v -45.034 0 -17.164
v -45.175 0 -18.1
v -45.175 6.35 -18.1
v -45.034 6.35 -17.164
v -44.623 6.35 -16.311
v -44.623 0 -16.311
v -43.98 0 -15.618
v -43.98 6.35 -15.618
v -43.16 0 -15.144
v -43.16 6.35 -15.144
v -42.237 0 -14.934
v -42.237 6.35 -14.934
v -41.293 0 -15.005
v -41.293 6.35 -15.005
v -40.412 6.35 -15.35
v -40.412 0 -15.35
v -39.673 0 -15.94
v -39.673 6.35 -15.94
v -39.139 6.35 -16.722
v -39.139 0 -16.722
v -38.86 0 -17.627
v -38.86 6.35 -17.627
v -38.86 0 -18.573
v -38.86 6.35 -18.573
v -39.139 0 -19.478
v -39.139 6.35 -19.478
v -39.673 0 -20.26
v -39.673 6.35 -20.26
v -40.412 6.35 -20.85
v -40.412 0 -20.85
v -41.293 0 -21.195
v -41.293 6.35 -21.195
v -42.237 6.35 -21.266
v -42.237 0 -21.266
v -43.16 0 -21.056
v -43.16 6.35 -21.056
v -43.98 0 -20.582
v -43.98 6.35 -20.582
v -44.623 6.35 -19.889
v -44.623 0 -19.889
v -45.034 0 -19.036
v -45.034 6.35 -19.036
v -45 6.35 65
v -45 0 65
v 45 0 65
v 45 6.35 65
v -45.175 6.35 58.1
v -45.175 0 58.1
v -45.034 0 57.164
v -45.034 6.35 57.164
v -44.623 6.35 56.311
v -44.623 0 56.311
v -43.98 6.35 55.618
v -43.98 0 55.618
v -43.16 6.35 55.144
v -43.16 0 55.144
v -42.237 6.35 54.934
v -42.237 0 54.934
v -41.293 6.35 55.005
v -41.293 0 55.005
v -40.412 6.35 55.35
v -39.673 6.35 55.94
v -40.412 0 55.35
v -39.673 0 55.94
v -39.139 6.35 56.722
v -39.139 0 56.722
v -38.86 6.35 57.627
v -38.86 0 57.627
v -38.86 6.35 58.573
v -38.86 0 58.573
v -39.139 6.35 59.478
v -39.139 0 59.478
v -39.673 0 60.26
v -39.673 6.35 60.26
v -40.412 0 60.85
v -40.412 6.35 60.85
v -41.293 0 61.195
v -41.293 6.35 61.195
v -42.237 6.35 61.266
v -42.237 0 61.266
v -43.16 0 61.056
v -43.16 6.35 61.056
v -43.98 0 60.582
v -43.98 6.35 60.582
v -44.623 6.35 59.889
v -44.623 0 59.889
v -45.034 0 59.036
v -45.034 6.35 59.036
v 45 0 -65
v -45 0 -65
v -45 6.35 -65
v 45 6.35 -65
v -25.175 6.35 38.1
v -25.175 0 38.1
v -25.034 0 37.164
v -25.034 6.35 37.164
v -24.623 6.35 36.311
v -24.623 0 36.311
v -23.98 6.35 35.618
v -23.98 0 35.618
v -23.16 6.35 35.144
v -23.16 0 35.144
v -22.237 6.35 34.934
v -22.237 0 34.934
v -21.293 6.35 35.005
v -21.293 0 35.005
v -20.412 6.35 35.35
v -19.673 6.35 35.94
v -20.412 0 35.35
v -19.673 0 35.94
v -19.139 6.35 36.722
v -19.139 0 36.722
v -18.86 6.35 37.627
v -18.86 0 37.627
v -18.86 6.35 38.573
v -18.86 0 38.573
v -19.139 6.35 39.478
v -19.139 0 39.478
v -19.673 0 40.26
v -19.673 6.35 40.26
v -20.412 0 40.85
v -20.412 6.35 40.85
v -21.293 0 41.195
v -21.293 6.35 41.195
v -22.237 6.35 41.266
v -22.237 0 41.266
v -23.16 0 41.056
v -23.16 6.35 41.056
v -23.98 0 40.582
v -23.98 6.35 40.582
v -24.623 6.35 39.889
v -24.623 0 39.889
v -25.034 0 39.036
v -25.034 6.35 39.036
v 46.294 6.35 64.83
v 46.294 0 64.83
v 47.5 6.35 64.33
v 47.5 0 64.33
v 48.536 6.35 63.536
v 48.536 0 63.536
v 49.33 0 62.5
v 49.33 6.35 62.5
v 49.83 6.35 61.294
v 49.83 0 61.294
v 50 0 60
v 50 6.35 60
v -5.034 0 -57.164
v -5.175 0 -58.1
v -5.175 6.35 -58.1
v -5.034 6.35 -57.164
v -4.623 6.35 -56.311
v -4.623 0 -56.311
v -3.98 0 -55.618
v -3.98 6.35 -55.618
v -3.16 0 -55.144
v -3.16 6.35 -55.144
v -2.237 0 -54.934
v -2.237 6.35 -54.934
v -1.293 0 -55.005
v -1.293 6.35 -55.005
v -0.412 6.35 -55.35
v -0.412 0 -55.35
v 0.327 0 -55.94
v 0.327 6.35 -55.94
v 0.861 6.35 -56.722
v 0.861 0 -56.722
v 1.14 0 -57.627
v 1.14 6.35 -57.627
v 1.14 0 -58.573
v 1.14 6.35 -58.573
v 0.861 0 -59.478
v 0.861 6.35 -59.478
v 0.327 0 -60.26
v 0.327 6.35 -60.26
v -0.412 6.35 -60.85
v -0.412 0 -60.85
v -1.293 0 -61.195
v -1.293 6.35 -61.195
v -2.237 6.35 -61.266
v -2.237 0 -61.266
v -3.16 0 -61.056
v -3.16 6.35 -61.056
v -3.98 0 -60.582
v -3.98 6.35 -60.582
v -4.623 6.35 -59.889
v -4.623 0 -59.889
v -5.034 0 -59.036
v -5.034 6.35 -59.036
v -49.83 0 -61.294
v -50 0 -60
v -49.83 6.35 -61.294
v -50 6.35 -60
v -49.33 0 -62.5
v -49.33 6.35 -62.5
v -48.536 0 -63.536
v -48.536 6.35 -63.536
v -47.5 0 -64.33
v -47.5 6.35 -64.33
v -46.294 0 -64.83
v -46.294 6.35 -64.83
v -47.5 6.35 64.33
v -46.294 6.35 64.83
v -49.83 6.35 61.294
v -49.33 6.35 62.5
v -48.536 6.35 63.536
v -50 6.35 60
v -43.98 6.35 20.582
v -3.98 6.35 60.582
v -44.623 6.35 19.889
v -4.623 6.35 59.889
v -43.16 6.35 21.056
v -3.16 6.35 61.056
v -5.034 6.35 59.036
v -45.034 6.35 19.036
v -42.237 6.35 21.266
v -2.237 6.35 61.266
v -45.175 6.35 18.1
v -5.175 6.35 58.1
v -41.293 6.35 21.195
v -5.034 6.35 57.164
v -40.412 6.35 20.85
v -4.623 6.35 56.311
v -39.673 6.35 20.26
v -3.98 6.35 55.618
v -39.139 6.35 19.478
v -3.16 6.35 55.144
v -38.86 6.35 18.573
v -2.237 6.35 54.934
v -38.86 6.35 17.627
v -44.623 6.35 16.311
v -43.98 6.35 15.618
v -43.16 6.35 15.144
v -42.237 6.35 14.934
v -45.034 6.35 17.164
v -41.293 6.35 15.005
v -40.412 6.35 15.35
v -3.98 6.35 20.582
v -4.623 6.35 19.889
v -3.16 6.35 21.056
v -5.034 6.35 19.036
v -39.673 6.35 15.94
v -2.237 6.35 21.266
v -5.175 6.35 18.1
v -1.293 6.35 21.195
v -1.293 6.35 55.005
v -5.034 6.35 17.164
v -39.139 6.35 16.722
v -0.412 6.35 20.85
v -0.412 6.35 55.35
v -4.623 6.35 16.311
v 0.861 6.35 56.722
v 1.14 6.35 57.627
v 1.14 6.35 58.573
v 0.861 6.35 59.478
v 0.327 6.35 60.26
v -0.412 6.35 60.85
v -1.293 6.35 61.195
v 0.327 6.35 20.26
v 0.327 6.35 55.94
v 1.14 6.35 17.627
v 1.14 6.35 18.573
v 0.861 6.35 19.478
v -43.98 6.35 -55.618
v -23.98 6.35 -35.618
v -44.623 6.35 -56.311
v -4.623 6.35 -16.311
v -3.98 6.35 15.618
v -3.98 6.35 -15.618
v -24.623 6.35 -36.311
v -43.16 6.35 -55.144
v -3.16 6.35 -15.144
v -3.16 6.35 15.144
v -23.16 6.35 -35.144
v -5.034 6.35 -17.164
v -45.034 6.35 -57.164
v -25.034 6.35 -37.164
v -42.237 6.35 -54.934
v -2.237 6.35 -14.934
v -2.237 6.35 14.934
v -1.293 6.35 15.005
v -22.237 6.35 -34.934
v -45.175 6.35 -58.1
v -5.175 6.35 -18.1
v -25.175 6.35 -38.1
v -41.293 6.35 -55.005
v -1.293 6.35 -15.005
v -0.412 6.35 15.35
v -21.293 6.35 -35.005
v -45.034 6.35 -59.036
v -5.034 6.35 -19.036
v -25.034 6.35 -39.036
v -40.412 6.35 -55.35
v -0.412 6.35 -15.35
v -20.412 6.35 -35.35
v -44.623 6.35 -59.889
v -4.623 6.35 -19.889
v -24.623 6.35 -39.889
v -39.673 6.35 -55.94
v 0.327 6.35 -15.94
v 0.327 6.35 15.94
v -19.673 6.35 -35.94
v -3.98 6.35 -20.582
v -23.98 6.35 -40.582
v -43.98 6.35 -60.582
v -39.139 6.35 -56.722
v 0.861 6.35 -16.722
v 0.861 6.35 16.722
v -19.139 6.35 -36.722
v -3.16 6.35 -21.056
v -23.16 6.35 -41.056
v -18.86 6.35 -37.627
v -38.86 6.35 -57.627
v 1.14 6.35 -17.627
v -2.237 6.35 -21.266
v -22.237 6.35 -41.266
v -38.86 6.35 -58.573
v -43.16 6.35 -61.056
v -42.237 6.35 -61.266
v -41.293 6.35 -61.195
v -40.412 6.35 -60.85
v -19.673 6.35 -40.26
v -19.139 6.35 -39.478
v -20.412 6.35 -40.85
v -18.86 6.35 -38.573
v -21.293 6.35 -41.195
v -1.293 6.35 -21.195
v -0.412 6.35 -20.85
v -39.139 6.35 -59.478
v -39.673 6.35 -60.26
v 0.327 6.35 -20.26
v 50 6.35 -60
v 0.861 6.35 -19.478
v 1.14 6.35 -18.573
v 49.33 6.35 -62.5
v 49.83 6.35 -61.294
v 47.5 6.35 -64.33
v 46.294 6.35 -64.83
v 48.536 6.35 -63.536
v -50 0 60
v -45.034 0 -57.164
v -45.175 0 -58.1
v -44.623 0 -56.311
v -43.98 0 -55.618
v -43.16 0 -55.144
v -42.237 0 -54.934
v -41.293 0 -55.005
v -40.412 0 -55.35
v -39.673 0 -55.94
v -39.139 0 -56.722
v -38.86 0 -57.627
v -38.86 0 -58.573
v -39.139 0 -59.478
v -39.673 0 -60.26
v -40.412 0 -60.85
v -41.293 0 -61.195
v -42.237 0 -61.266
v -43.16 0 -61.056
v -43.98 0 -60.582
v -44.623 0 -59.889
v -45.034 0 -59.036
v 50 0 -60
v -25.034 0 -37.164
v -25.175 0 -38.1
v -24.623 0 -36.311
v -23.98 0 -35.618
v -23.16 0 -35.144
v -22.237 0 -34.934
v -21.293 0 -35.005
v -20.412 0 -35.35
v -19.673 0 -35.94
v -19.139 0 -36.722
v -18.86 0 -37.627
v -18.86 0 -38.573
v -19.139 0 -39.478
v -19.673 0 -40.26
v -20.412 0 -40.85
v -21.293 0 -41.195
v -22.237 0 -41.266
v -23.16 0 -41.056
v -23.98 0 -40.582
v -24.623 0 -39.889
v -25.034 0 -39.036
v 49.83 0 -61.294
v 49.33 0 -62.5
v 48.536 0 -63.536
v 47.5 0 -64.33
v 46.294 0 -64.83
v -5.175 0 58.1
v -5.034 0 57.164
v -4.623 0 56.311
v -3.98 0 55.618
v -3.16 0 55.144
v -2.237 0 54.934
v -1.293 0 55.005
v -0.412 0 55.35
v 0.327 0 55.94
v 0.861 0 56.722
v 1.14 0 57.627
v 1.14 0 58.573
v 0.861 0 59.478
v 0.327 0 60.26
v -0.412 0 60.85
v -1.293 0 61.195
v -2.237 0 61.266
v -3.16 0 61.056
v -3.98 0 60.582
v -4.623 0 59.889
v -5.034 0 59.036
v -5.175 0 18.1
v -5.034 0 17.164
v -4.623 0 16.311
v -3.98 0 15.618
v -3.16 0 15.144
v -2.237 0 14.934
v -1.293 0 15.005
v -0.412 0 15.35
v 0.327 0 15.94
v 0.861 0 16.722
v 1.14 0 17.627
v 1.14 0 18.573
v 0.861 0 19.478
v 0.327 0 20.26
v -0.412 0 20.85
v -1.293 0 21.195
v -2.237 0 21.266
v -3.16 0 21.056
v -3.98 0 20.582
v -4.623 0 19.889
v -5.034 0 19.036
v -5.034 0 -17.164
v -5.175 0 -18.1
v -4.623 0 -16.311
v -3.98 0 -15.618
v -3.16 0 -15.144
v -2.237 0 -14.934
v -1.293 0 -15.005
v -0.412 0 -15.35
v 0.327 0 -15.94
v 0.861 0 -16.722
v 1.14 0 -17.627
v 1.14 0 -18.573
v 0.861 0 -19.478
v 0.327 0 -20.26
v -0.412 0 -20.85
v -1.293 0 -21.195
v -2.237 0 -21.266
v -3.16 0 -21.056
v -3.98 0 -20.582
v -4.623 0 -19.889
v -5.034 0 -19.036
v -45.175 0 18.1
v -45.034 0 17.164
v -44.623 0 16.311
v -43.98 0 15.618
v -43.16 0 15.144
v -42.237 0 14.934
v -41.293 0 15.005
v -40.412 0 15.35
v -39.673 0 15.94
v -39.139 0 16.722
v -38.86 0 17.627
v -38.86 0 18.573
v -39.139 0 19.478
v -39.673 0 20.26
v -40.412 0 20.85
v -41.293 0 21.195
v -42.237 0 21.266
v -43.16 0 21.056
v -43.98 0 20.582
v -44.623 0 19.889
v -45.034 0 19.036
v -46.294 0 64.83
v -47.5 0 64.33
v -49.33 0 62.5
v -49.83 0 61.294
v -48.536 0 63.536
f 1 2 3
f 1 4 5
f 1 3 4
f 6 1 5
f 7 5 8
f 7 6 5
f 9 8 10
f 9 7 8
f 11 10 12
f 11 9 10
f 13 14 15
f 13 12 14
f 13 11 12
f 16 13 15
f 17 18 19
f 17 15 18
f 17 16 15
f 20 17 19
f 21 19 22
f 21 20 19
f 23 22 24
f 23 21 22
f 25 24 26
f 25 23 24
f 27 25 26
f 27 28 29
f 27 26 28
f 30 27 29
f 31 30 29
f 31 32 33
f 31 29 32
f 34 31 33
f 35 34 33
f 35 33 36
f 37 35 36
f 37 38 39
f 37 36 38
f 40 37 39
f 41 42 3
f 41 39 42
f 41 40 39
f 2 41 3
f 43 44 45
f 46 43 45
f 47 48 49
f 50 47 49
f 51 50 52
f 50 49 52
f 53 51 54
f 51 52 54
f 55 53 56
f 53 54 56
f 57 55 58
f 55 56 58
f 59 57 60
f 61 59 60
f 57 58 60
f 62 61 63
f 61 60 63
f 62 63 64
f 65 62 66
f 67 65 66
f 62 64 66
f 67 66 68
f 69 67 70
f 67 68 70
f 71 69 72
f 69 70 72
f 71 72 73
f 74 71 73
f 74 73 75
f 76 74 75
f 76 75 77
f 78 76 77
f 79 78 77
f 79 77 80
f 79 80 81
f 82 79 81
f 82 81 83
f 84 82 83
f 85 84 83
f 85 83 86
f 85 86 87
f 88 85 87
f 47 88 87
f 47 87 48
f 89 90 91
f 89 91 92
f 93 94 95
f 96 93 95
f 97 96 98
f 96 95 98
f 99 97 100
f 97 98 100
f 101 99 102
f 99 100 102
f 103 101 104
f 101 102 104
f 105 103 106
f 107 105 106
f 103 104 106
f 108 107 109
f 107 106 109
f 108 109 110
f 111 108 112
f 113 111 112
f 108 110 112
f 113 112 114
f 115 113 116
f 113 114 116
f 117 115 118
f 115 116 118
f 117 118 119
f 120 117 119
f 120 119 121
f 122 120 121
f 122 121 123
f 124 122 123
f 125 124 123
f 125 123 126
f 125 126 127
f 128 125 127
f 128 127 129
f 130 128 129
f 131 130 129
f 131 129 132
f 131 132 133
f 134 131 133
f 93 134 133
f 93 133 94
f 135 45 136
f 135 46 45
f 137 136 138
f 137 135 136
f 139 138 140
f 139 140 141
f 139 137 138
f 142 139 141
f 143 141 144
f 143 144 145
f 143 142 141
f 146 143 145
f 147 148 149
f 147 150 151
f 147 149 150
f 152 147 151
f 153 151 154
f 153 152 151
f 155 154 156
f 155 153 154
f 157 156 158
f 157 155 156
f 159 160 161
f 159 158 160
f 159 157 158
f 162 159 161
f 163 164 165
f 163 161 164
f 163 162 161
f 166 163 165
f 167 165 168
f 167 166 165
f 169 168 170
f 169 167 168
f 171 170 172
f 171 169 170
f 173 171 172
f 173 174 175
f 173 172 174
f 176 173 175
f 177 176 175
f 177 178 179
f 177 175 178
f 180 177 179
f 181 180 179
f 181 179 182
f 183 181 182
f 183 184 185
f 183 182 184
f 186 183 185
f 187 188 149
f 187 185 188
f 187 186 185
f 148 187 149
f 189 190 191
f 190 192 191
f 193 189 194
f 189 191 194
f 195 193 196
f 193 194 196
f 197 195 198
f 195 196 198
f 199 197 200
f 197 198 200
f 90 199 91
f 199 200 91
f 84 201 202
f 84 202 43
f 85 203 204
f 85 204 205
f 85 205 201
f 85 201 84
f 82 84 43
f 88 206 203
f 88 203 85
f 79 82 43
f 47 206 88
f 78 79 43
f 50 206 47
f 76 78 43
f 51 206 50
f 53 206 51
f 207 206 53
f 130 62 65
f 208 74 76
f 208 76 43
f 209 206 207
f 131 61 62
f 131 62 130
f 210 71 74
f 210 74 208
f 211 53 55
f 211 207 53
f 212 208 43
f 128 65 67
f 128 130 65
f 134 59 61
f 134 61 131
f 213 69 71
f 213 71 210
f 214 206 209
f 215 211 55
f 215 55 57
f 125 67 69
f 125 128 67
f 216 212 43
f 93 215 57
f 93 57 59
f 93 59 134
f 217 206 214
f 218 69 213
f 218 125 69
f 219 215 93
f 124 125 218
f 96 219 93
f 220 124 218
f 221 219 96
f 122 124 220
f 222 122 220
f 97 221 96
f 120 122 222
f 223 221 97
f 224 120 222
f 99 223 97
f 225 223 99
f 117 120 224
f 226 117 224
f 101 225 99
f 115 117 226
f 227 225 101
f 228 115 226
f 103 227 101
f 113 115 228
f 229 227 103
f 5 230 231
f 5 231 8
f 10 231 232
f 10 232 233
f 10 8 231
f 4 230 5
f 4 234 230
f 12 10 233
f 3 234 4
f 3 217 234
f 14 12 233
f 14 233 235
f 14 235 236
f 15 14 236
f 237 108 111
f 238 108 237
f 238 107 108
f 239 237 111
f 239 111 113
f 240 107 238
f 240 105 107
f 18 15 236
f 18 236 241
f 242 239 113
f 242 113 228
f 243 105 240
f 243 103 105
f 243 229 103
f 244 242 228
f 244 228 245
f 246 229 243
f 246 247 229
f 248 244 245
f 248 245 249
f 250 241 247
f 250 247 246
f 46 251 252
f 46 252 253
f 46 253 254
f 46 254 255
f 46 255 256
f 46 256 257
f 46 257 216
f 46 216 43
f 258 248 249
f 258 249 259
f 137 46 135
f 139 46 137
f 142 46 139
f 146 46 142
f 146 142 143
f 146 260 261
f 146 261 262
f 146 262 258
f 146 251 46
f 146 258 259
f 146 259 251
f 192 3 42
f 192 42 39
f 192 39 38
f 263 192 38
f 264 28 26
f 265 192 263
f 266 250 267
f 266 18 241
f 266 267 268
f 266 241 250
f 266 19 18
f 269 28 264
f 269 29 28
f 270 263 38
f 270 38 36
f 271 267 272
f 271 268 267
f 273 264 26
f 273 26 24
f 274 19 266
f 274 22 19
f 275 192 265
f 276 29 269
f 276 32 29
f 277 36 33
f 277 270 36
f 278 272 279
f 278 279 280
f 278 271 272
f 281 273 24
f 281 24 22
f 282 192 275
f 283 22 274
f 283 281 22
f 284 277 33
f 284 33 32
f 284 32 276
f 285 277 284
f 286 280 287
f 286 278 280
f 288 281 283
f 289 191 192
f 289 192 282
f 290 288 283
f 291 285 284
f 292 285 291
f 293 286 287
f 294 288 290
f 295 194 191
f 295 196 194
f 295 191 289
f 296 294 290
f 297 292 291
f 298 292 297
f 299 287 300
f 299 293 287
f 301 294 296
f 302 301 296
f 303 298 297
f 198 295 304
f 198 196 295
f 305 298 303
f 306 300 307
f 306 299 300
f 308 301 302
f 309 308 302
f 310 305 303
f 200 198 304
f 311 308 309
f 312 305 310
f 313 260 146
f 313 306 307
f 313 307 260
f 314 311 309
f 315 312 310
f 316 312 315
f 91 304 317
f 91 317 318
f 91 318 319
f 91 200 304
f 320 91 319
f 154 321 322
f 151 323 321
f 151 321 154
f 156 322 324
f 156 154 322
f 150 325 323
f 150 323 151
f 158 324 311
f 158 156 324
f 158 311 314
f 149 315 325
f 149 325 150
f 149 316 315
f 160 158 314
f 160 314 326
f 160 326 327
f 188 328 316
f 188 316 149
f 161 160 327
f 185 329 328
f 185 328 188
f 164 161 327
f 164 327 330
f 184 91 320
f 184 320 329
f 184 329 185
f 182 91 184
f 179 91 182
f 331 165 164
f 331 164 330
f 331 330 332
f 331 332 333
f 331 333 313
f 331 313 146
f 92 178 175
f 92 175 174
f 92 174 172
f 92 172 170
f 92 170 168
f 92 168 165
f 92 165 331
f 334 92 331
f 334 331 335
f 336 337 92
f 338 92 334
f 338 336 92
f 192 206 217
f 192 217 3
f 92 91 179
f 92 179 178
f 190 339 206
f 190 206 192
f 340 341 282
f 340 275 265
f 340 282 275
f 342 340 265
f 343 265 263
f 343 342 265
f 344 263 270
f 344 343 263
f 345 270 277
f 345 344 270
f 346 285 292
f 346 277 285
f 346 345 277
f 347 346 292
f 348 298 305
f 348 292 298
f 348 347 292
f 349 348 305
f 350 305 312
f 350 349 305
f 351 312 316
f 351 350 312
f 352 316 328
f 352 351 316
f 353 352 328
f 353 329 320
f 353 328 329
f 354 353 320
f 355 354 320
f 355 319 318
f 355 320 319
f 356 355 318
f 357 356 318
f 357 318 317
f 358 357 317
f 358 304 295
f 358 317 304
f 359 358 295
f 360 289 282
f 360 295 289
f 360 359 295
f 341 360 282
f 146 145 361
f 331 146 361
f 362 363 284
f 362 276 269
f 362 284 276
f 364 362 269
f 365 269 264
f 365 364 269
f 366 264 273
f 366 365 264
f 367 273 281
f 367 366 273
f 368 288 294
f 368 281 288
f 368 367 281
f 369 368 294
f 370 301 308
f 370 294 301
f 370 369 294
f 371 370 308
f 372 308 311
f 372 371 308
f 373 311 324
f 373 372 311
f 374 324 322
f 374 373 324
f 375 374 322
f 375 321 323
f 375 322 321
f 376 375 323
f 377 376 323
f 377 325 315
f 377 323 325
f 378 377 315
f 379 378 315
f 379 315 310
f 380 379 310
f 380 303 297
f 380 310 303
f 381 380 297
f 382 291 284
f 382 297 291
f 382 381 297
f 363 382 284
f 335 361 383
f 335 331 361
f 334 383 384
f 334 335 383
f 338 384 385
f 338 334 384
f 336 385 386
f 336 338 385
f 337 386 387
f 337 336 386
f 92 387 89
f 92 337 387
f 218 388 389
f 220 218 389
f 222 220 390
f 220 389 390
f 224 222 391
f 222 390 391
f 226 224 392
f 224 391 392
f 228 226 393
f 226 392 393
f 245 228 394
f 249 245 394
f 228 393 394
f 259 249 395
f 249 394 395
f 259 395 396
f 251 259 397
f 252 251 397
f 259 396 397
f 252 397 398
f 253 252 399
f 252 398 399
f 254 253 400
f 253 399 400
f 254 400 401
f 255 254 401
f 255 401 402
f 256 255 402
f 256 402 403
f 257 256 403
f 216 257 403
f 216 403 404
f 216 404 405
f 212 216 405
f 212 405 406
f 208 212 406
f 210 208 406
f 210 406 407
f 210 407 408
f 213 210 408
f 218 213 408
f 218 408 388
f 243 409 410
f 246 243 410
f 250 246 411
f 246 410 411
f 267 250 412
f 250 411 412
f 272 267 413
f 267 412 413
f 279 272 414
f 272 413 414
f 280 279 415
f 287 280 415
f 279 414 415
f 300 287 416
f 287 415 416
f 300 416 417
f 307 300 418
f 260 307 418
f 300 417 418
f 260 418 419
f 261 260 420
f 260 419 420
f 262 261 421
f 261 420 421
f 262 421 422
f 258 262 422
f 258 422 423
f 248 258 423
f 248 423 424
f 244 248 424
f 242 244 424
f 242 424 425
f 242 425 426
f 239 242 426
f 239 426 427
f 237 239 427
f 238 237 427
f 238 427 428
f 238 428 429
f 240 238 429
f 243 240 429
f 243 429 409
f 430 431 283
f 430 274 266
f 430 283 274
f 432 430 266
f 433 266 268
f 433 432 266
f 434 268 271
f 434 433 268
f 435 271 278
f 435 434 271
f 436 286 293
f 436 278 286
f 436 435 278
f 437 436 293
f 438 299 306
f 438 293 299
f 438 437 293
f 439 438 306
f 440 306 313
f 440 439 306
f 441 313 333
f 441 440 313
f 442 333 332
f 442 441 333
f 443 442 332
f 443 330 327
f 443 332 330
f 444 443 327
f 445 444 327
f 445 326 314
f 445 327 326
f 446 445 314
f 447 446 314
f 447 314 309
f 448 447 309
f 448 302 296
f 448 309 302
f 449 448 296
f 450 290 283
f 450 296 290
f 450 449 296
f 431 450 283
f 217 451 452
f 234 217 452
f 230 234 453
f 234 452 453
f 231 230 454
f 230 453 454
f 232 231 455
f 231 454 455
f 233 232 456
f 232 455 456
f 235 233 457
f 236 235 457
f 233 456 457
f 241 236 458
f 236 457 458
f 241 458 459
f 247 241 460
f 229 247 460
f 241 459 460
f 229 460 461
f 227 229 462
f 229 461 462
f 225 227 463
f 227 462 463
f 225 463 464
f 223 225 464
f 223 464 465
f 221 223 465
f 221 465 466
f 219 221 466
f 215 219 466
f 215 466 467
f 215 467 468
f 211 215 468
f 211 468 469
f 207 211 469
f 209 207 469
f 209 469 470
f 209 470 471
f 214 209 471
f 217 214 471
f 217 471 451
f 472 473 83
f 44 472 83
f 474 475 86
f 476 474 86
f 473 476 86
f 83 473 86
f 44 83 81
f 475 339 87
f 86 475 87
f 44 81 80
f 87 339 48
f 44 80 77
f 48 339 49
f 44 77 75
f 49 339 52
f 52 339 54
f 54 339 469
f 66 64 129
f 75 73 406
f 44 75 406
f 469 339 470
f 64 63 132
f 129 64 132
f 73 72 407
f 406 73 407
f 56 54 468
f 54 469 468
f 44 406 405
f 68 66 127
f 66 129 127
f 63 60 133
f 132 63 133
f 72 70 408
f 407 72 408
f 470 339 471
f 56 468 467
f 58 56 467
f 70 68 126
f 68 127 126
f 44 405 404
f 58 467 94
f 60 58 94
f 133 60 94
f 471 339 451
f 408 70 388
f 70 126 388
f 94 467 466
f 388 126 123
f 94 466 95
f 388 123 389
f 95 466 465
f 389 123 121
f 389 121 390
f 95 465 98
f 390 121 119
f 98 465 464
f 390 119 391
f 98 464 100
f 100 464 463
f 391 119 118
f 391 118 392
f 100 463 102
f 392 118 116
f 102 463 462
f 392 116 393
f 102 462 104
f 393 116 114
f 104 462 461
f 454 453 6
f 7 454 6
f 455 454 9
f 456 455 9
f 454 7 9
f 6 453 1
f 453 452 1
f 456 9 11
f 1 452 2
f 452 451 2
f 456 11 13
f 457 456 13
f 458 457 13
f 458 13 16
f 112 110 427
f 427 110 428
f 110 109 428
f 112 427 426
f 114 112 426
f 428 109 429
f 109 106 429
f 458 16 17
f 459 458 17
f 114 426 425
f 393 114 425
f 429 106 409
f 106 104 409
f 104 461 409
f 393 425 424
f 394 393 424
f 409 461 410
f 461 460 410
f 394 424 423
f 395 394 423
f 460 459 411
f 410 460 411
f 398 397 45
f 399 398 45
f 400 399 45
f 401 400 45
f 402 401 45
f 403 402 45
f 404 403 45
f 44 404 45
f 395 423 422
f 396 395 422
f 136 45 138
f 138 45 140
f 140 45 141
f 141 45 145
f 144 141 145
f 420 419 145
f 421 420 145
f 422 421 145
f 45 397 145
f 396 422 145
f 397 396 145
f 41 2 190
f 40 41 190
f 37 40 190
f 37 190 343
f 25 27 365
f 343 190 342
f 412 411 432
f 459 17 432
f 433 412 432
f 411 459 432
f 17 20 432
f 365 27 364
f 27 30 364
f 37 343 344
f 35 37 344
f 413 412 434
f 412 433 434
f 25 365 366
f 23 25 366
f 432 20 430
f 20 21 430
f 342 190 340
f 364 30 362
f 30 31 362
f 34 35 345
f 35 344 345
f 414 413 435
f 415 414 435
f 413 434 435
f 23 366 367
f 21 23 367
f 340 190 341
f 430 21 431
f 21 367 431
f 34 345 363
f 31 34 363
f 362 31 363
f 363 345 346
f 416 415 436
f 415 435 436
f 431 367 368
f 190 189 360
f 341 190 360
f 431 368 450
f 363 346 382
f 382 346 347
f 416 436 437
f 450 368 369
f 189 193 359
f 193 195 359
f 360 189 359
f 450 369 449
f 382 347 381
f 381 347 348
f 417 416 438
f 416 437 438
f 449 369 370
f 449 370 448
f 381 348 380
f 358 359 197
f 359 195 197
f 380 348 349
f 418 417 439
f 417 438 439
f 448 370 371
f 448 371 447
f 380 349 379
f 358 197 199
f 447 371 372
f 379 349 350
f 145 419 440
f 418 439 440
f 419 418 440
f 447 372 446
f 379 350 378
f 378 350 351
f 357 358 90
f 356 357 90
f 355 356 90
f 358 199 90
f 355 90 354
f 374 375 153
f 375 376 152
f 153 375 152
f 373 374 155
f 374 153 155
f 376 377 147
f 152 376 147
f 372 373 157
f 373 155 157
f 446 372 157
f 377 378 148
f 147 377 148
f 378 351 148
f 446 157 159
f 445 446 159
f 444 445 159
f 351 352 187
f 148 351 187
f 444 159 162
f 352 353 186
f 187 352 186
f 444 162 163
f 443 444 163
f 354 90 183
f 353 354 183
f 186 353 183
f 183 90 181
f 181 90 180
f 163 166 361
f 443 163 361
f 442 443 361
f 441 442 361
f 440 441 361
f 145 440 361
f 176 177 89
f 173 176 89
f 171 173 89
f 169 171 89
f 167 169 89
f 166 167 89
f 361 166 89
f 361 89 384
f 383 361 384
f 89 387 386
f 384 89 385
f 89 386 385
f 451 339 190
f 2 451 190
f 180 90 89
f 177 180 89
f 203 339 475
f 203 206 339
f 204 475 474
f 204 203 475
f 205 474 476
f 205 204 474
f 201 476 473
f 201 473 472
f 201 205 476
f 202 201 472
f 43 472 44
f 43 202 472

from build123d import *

# Parameters (mm, degrees)
SKETCH1_W                   = 100
SKETCH1_H                   = 130
BOSS_EXTRUDE1_DEPTH         = 6.35
FILLET1_R                   = 5
F_1_4_0_25_DIAMETER_HOLE1_D = 6.35


with BuildPart() as part:
    # Sketch1 → Boss-Extrude1 (new body)
    with BuildSketch(Plane(origin=(0, 0, 0), x_dir=(1, 0, 0), z_dir=(0, 1, 0))):
        Rectangle(SKETCH1_W, SKETCH1_H)
    extrude(amount=BOSS_EXTRUDE1_DEPTH)

    # Fillet1
    fillet1_edges = [part.edges().sort_by_distance(p)[0] for p in [
        (-50, 3.175, 65),
        (-50, 3.175, -65),
        (50, 3.175, -65),
        (50, 3.175, 65),
    ]]
    fillet(fillet1_edges, radius=FILLET1_R)

    # 1/4 (0.25) Diameter Hole1 (through all)
    with Locations(Plane(origin=(0, 6.35, 0), x_dir=(1, 0, 0), z_dir=(0, 1, 0))):
        with Locations((-42, -18.1), (-2, -18.1), (-2, -58.1), (-42, -58.1), (-22, -38.1)):
            f_1_4_0_25_diameter_hole1 = Hole(F_1_4_0_25_DIAMETER_HOLE1_D / 2)

    # Mirror1: 1/4 (0.25) Diameter Hole1 across plane
    add(f_1_4_0_25_diameter_hole1.mirror(Plane.XY), mode=Mode.SUBTRACT)


solid = part.part
